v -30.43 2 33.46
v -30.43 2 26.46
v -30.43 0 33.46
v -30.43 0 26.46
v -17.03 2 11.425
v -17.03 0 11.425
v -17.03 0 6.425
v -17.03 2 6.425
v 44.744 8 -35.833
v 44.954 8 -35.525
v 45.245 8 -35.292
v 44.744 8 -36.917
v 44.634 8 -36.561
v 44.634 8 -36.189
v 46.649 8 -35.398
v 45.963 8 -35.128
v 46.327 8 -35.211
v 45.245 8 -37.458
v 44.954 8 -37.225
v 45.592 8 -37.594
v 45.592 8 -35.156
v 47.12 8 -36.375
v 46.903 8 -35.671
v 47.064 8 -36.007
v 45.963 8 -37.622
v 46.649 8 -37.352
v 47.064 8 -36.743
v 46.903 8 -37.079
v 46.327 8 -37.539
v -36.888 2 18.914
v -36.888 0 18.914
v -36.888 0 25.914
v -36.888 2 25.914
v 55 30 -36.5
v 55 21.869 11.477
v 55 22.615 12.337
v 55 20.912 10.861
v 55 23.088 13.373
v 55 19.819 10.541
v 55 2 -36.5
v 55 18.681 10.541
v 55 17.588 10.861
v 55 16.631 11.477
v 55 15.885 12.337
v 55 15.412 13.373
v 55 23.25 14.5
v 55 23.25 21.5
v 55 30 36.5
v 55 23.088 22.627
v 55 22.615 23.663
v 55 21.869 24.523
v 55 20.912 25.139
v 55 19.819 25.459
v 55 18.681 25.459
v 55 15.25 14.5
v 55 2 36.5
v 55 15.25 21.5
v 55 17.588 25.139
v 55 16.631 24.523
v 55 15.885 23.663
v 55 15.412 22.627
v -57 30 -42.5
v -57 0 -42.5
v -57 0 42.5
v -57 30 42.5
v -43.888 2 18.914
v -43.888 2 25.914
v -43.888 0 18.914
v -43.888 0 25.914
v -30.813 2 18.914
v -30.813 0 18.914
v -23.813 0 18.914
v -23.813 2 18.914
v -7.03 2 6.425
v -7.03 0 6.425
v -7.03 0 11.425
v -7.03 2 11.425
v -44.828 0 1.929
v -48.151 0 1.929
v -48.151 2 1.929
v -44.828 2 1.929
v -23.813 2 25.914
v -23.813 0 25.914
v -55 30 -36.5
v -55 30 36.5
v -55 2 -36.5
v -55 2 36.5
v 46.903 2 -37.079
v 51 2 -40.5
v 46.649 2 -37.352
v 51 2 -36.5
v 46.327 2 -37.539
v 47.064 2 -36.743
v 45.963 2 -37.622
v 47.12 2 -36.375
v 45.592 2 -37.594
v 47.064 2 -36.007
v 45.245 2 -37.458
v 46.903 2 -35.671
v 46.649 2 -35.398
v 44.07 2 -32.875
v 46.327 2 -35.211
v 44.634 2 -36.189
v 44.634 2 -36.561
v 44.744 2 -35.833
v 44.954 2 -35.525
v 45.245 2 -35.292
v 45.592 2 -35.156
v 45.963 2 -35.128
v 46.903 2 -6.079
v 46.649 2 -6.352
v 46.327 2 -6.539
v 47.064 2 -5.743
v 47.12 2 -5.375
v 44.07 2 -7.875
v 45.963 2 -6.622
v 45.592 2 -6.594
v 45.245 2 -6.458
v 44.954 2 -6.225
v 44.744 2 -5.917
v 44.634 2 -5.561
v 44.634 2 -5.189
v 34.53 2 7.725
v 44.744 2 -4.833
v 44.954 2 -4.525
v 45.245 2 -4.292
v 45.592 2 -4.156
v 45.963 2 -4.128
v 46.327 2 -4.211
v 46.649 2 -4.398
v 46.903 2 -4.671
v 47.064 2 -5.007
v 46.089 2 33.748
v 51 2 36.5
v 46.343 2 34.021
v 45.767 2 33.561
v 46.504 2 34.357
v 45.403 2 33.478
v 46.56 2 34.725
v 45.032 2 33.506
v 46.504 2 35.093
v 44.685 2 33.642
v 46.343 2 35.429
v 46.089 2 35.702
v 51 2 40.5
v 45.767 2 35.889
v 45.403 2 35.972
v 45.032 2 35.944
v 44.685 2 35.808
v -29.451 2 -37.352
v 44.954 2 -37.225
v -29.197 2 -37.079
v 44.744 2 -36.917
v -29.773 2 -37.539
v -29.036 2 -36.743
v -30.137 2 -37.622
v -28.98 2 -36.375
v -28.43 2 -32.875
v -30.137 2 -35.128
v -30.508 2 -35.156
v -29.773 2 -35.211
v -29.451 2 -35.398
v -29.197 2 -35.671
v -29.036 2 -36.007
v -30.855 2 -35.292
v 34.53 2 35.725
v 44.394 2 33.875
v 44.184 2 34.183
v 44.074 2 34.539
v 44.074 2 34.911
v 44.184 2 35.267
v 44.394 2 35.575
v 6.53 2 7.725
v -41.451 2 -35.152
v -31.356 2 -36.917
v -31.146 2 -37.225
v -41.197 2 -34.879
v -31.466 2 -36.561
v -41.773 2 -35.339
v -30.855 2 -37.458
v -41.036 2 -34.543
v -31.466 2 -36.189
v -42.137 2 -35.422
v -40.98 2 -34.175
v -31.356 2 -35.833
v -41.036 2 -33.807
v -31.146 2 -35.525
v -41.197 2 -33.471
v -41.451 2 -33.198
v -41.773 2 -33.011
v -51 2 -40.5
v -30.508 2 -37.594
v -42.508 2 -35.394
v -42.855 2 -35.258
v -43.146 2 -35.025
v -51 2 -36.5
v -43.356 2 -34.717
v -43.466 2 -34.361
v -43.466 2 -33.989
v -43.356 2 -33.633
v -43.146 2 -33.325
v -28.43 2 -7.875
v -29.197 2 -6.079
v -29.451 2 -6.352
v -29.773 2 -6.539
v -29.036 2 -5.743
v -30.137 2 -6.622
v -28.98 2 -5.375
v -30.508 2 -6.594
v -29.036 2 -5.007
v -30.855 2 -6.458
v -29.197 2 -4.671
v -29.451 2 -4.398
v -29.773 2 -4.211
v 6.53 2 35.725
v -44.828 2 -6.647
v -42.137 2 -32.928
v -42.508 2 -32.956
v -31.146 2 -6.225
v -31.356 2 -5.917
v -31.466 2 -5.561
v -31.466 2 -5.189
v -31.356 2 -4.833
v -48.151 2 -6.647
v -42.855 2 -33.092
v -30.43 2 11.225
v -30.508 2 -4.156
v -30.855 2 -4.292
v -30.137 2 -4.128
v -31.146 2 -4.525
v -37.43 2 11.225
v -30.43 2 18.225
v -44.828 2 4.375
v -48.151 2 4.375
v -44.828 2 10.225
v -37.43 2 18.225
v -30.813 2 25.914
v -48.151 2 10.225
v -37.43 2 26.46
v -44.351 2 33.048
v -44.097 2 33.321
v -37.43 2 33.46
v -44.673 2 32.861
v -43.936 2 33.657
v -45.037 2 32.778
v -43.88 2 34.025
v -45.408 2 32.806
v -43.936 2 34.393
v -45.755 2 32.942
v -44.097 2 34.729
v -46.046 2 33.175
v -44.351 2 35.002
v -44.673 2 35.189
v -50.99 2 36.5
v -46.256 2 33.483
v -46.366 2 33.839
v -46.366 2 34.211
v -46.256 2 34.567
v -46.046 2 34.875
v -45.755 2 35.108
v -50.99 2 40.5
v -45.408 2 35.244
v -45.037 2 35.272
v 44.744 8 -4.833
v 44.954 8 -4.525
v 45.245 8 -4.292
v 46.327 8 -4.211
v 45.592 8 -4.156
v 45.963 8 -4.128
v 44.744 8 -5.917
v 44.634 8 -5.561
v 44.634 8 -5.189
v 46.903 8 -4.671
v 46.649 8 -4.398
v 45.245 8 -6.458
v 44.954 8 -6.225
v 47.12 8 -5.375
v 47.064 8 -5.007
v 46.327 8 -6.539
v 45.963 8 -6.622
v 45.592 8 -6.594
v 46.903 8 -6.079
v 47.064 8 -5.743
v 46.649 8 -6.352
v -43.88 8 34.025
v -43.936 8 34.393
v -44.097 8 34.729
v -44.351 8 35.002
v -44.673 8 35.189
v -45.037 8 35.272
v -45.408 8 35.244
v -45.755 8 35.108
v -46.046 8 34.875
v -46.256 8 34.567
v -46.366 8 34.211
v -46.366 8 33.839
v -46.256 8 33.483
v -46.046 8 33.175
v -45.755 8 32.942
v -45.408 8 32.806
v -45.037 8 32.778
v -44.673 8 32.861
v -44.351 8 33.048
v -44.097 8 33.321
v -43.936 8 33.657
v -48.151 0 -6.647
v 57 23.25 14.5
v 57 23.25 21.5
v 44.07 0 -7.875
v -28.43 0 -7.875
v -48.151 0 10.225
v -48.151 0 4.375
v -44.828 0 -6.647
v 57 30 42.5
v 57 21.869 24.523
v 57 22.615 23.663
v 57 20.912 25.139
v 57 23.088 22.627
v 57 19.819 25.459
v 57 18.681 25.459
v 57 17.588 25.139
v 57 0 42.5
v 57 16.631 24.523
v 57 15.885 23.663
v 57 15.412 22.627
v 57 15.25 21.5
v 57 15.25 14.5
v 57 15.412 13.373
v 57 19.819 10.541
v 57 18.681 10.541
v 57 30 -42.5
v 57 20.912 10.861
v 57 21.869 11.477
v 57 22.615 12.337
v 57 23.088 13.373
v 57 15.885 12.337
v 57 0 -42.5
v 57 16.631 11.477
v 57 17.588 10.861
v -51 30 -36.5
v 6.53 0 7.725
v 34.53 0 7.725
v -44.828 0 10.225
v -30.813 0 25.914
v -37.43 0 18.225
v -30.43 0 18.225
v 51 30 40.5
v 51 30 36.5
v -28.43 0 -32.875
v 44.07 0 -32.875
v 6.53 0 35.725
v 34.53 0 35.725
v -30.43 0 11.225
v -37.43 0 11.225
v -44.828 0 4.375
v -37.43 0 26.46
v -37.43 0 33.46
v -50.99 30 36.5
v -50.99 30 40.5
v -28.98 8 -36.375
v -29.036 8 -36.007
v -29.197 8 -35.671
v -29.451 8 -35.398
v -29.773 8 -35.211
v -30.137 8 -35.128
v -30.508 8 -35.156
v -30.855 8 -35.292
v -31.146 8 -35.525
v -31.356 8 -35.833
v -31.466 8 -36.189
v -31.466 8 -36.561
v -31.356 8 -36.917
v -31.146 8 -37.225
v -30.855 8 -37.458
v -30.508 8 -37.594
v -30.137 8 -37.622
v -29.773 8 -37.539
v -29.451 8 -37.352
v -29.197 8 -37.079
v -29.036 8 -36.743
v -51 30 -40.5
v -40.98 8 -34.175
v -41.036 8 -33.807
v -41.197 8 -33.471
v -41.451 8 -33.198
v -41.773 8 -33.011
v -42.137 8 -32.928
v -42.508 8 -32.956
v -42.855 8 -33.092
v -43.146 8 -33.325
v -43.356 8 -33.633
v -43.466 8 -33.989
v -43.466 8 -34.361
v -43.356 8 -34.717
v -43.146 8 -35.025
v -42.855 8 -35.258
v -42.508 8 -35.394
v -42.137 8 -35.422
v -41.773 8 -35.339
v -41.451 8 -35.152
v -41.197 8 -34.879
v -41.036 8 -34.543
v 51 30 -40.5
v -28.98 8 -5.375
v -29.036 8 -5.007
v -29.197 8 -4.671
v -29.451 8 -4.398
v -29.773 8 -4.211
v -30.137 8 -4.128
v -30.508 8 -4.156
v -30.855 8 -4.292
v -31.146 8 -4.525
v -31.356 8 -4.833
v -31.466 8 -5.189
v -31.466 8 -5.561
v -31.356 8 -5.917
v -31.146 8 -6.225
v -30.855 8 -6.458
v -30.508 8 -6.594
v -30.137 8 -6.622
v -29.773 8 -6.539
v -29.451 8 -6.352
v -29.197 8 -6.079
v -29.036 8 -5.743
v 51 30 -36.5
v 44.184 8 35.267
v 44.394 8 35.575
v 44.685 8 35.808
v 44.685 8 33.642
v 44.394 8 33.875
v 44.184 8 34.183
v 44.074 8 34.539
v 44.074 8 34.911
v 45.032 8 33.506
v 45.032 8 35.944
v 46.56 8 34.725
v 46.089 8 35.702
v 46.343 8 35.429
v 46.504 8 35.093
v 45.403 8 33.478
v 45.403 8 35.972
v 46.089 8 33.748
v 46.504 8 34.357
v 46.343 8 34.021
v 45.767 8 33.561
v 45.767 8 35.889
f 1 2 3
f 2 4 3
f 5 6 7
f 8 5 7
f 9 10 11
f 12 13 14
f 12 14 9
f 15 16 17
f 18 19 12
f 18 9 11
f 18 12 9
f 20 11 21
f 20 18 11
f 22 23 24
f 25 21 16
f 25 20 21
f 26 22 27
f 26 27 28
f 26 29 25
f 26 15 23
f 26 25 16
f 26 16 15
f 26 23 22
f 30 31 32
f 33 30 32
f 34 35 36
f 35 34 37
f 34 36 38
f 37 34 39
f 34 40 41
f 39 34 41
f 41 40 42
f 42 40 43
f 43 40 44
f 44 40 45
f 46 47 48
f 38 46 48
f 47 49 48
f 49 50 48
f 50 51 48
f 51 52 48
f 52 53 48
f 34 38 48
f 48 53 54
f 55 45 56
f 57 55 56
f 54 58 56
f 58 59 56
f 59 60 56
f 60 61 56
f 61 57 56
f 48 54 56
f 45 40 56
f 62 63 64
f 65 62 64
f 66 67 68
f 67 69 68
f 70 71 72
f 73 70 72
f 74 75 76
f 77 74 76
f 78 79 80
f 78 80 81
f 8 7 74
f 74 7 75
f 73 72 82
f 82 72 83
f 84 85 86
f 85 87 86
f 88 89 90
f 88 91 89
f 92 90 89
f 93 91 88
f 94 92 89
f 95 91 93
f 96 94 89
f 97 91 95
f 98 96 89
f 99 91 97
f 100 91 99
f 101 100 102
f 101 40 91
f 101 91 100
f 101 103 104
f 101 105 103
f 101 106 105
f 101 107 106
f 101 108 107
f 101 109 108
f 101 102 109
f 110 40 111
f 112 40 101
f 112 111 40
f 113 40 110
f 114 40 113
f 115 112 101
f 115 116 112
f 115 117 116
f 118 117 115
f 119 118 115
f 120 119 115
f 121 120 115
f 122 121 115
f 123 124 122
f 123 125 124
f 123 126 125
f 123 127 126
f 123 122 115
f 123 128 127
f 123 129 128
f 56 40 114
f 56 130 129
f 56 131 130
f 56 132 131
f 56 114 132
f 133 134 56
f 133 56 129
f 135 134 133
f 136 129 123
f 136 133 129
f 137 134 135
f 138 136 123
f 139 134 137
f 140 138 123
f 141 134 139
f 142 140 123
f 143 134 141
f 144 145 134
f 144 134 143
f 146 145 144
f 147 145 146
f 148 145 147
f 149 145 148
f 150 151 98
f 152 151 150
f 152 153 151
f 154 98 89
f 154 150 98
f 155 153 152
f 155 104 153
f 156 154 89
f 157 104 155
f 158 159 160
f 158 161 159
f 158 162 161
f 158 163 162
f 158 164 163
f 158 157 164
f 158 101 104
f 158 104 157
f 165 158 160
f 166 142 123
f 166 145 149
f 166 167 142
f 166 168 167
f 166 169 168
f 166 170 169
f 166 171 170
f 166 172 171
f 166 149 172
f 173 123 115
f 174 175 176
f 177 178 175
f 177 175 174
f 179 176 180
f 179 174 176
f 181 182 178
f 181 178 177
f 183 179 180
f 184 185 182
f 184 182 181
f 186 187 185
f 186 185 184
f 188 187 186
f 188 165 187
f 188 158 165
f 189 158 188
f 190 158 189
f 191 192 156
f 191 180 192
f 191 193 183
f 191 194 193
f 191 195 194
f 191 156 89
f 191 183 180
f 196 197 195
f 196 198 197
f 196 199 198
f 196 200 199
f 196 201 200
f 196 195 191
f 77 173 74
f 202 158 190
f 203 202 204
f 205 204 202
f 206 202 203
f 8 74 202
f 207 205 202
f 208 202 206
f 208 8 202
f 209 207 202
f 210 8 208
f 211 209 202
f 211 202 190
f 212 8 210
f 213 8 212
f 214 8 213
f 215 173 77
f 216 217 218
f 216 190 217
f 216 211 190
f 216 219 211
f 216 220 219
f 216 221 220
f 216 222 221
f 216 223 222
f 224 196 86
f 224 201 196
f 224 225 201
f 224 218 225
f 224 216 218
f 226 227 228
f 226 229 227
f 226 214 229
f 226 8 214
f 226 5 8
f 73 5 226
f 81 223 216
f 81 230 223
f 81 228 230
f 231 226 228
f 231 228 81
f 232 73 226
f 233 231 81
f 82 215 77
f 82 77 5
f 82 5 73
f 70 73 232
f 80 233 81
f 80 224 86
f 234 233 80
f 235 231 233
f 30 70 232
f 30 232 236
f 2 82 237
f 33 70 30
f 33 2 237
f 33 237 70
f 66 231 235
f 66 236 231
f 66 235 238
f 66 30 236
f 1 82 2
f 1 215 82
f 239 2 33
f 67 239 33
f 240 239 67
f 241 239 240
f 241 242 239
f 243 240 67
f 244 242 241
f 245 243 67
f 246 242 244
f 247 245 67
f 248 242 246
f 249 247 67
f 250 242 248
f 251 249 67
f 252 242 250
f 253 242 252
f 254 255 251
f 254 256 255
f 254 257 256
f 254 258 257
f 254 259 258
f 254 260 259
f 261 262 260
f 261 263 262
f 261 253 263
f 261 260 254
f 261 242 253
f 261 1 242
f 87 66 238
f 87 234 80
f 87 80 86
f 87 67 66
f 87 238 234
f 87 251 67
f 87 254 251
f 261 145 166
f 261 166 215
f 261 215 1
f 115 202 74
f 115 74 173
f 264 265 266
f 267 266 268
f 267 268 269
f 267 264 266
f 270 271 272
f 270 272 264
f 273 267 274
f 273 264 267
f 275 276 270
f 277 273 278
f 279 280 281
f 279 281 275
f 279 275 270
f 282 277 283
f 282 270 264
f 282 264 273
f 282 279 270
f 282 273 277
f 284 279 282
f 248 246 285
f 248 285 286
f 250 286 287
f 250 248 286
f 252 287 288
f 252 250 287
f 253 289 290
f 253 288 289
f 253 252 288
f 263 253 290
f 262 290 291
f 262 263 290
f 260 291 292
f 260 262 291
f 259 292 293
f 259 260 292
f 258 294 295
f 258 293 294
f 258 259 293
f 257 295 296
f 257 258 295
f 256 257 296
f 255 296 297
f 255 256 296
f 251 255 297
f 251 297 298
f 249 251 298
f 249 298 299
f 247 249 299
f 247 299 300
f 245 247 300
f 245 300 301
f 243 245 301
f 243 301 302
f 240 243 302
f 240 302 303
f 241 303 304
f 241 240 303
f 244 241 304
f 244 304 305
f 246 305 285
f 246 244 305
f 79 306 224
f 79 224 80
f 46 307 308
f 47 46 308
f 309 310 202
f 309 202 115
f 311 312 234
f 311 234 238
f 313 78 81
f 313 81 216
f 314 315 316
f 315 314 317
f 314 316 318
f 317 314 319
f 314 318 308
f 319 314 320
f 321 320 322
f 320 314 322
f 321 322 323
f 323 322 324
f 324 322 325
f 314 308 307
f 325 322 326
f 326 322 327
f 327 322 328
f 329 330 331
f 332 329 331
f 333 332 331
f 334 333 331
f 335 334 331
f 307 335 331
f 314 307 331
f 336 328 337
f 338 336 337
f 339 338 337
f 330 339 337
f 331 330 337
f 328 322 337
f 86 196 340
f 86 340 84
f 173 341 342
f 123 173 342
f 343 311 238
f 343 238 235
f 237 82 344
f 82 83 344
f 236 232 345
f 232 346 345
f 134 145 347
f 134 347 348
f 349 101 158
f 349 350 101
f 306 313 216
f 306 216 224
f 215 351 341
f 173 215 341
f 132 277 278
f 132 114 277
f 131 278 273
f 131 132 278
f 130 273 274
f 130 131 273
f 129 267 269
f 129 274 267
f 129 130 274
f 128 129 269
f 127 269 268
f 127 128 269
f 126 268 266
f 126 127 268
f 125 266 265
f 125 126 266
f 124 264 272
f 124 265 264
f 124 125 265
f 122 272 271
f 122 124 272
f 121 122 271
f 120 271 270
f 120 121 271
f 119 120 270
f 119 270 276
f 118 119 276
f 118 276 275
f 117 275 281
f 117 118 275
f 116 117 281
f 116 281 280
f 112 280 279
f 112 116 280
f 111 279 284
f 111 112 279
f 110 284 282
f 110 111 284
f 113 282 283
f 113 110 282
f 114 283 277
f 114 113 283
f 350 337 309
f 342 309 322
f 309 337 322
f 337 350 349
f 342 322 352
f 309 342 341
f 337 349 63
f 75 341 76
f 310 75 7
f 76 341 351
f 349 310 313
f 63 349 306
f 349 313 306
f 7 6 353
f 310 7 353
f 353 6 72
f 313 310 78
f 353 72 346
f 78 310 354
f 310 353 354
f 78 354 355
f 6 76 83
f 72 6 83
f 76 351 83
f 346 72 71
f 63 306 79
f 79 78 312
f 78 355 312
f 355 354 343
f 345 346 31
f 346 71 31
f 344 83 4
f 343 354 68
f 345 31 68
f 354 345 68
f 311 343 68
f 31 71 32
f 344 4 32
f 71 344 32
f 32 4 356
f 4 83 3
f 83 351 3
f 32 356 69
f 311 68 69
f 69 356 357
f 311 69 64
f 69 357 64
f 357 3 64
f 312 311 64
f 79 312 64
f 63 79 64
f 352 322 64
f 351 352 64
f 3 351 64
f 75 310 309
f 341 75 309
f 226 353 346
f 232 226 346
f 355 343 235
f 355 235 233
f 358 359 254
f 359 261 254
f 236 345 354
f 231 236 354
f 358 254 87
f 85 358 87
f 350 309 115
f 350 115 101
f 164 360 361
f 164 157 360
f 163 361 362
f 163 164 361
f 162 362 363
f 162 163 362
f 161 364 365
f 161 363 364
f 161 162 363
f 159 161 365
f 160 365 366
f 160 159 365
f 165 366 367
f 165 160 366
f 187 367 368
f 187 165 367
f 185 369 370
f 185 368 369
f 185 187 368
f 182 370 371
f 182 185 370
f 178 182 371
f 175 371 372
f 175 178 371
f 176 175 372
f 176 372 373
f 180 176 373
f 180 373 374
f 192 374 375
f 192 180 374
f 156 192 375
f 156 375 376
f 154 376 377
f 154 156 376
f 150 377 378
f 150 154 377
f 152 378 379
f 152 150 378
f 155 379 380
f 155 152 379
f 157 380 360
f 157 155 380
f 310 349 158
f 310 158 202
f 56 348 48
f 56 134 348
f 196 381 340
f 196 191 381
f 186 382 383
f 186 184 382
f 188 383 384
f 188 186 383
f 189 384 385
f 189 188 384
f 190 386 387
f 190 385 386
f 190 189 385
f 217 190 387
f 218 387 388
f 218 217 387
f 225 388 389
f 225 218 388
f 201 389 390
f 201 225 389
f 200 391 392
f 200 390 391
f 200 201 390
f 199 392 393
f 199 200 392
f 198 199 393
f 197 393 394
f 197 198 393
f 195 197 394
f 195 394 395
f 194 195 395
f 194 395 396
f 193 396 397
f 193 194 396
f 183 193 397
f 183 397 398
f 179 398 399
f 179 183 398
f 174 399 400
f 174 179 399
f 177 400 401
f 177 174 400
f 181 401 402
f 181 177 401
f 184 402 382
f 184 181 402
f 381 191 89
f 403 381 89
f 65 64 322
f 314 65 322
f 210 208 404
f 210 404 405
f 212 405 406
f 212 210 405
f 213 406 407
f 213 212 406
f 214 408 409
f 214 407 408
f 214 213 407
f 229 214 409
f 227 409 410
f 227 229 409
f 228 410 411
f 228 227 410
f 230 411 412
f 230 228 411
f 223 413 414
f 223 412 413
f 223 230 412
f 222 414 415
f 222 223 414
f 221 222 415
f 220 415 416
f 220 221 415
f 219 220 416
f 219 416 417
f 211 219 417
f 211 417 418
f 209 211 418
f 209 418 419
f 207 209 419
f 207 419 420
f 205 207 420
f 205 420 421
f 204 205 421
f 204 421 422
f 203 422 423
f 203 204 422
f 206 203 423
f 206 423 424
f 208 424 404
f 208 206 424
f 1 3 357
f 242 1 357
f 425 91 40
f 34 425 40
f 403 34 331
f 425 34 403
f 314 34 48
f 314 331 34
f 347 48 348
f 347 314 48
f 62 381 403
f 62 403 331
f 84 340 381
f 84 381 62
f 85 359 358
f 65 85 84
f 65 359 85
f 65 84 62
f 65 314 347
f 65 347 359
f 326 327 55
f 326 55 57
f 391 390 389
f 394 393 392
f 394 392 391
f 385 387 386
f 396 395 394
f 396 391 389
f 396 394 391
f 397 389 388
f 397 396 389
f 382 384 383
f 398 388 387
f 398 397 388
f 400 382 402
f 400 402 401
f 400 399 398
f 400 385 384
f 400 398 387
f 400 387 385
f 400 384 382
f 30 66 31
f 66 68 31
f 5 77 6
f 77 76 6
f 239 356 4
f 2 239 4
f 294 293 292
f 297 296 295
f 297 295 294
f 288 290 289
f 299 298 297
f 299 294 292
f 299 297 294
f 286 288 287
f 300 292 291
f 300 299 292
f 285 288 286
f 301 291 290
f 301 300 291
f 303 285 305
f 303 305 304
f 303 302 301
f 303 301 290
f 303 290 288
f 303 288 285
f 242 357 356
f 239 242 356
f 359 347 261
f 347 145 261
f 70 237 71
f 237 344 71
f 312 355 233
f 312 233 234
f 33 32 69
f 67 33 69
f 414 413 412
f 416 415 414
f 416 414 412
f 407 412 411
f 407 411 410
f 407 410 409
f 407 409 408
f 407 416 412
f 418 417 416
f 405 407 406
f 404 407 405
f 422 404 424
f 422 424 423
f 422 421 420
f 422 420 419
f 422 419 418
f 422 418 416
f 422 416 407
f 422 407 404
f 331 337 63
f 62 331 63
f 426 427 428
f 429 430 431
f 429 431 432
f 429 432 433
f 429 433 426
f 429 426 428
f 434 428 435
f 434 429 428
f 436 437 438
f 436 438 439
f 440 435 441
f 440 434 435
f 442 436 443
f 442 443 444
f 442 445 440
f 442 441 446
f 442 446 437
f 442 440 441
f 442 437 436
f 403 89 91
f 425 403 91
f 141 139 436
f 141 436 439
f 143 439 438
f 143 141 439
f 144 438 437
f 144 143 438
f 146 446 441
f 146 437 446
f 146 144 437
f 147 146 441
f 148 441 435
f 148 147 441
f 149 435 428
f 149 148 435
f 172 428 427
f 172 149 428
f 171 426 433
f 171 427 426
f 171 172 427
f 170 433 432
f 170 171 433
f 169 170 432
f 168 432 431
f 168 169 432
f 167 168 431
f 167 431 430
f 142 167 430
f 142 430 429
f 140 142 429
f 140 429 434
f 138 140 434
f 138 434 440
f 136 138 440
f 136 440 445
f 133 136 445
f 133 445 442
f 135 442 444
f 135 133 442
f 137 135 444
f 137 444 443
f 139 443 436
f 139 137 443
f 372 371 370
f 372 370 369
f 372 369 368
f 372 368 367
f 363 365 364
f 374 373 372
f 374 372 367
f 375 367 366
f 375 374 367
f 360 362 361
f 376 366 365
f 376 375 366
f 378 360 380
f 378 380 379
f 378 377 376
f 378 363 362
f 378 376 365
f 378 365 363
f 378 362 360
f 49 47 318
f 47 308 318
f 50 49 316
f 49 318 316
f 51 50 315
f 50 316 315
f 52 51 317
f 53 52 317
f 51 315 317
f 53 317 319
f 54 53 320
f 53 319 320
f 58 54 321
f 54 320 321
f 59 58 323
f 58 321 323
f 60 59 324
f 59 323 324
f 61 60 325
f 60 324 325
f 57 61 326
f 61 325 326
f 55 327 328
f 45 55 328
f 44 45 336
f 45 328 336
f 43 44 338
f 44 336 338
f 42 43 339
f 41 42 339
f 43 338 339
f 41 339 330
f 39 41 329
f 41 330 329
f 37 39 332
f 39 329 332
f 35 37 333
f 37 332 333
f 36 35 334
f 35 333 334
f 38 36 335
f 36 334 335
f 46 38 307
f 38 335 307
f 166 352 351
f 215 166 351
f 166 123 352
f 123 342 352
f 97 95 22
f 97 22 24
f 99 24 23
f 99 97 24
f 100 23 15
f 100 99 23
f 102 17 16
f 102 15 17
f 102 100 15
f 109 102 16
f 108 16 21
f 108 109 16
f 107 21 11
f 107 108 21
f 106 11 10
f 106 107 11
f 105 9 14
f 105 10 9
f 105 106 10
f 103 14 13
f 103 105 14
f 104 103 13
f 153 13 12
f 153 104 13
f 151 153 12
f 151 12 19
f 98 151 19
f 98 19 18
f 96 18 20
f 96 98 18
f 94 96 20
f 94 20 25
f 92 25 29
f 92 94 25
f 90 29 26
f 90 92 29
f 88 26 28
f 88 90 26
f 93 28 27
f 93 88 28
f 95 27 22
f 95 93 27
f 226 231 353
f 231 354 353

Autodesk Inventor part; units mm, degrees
ref_plane "YZ Plane" through (0, 0, 0) normal (1, 0, 0) x (0, 1, 0)
ref_plane "XZ Plane" through (0, 0, 0) normal (0, 1, 0) x (-1, 0, 0)
ref_plane "XY Plane" through (0, 0, 0) normal (0, 0, 1) x (1, 0, 0)
sketch "Sketch1" plane through (0, 0, 0) normal (0, 1, 0) x (-1, 0, 0)
  line L0 (55, -40.5) -> (-55, -40.5)
  line L1 (-55, -40.5) -> (-55, 40.5)
  line L2 (-55, 40.5) -> (55, 40.5)
  line L3 (55, 40.5) -> (55, -40.5)
  line L4 (55, -40.5) -> (-55, 40.5) construction
  line L5 (-55, -40.5) -> (55, 40.5) construction
  line L6 (57, 42.5) -> (-57, 42.5)
  line L7 (-57, 42.5) -> (-57, -42.5)
  line L8 (-57, -42.5) -> (57, -42.5)
  line L9 (57, -42.5) -> (57, 42.5)
  line L10 (57, 42.5) -> (-57, -42.5) construction
  line L11 (-57, 42.5) -> (57, -42.5) construction
  line L12 (50.43, 39.125) -> (-50.43, 39.125)
  line L13 (-50.43, 39.125) -> (-50.43, -39.125)
  line L14 (-50.43, -39.125) -> (50.43, -39.125)
  line L15 (50.43, -39.125) -> (50.43, 39.125)
  line L16 (50.43, 39.125) -> (-50.43, -39.125) construction
  line L17 (-50.43, 39.125) -> (50.43, -39.125) construction
  point P0 (0, 0)
  dimension "d0" = 110
  dimension "d1" = 81
  dimension "d2" = 114
  dimension "d3" = 85
  dimension "d190" = 100.86
  dimension "d191" = 78.25
extrude "Extrusion1" add sketch "Sketch1" along normal blind 30 contours L9 L8 L7 L6
sketch "Sketch2" plane through (0, 0, 0) normal (0, 1, 0) x (-1, 0, 0)
  line L0 (-55, -40.5) -> (-55, 40.5) projected
  line L1 (55, 40.5) -> (-55, 40.5)
  line L2 (-55, 40.5) -> (-55, -40.5)
  line L3 (-55, -40.5) -> (55, -40.5)
  line L4 (55, -40.5) -> (55, 40.5)
  line L5 (55, 40.5) -> (-55, -40.5) construction
  line L6 (-55, 40.5) -> (55, -40.5) construction
  point P0 (0, 0)
extrude "Extrusion2" add sketch "Sketch2" along normal blind 2
sketch "Sketch3" plane through (0, 0, 0) normal (0, -1, 0) x (1, 0, 0)
  line L0 (44.07, -32.875) -> (-28.43, -32.875)
  line L1 (-28.43, -32.875) -> (-28.43, -7.875)
  line L2 (-28.43, -7.875) -> (44.07, -7.875)
  line L3 (44.07, -7.875) -> (44.07, -32.875)
  line L4 (34.53, 35.725) -> (6.53, 35.725)
  line L5 (6.53, 35.725) -> (6.53, 7.725)
  line L6 (6.53, 7.725) -> (34.53, 7.725)
  line L7 (34.53, 7.725) -> (34.53, 35.725)
  line L8 (-7.03, 11.425) -> (-17.03, 11.425)
  line L9 (-17.03, 11.425) -> (-17.03, 6.425)
  line L10 (-17.03, 6.425) -> (-7.03, 6.425)
  line L11 (-7.03, 6.425) -> (-7.03, 11.425)
  line L12 (50.43, 39.125) -> (-50.43, 39.125)
  line L13 (-50.43, 39.125) -> (-50.43, -39.125)
  line L14 (-50.43, -39.125) -> (50.43, -39.125)
  line L15 (50.43, -39.125) -> (50.43, 39.125)
  line L16 (50.43, 39.125) -> (-50.43, -39.125) construction
  line L17 (-50.43, 39.125) -> (50.43, -39.125) construction
  line L18 (-30.4304, 18.225) -> (-37.4304, 18.225)
  line L19 (-37.4304, 18.225) -> (-37.4304, 11.225)
  line L20 (-37.4304, 11.225) -> (-30.4304, 11.225)
  line L21 (-30.4304, 11.225) -> (-30.4304, 18.225)
  line L22 (-30.4304, 18.225) -> (-37.4304, 11.225) construction
  line L23 (-37.4304, 18.225) -> (-30.4304, 11.225) construction
  line L24 (-30.4304, 33.4598) -> (-37.4304, 33.4598)
  line L25 (-37.4304, 33.4598) -> (-37.4304, 26.4598)
  line L26 (-37.4304, 26.4598) -> (-30.4304, 26.4598)
  line L27 (-30.4304, 26.4598) -> (-30.4304, 33.4598)
  line L28 (-30.4304, 33.4598) -> (-37.4304, 26.4598) construction
  line L29 (-37.4304, 33.4598) -> (-30.4304, 26.4598) construction
  line L30 (-23.8133, 25.9138) -> (-30.8133, 25.9138)
  line L31 (-30.8133, 25.9138) -> (-30.8133, 18.9138)
  line L32 (-30.8133, 18.9138) -> (-23.8133, 18.9138)
  line L33 (-23.8133, 18.9138) -> (-23.8133, 25.9138)
  line L34 (-23.8133, 25.9138) -> (-30.8133, 18.9138) construction
  line L35 (-30.8133, 25.9138) -> (-23.8133, 18.9138) construction
  line L36 (-36.8875, 25.9138) -> (-43.8875, 25.9138)
  line L37 (-43.8875, 25.9138) -> (-43.8875, 18.9138)
  line L38 (-43.8875, 18.9138) -> (-36.8875, 18.9138)
  line L39 (-36.8875, 18.9138) -> (-36.8875, 25.9138)
  line L40 (-36.8875, 25.9138) -> (-43.8875, 18.9138) construction
  line L41 (-43.8875, 25.9138) -> (-36.8875, 18.9138) construction
  line L42 (-50.43, 39.125) -> (50.4731, 39.0489) construction
  line L43 (50.4731, 39.0489) -> (50.4141, -39.1891) construction
  line L44 (50.4141, -39.1891) -> (-50.489, -39.113) construction
  line L45 (-50.489, -39.113) -> (-50.43, 39.125) construction
  line L46 (17.9042, 35.3523) -> (15.6181, 35.3523)
  line L47 (47.7465, 12.6947) -> (44.5311, 12.6947)
  line L48 (46.7465, 20.4524) -> (43.1682, 20.4524)
  line L49 (-57, 42.5) -> (57, 42.5) projected
  line L50 (-44.8275, -6.6468) -> (-48.1514, -6.6468)
  line L51 (-48.1514, -6.6468) -> (-48.1514, 1.9287)
  line L52 (-48.1514, 1.9287) -> (-44.8275, 1.9287)
  line L53 (-44.8275, 1.9287) -> (-44.8275, -6.6468)
  line L54 (-44.8275, 4.375) -> (-48.1514, 4.375)
  line L55 (-48.1514, 4.375) -> (-48.1514, 10.225)
  line L56 (-48.1514, 10.225) -> (-44.8275, 10.225)
  line L57 (-44.8275, 10.225) -> (-44.8275, 4.375)
  point P0 (0, 0)
  point P1 (-33.9304, 14.725)
  point P2 (-33.9304, 29.9598)
  point P3 (-27.3133, 22.4138)
  point P4 (-40.3875, 22.4138)
  point P5 (46.1388, 12.6947)
  dimension "d8" = 72.5
  dimension "d9" = 25
  dimension "d18" = 28
  dimension "d19" = 28
  dimension "d20" = 10
  dimension "d21" = 5
  dimension "d22" = 100.86
  dimension "d23" = 78.25
  dimension "d31" = 3.4
  dimension "d32" = 15.9
  dimension "d33" = 22
  dimension "d35" = 33.4
  dimension "d36" = 27.7
  dimension "d45" = 7
  dimension "d46" = 7
  dimension "d47" = 7
  dimension "d48" = 7
  dimension "d135" = 7
  dimension "d136" = 7
  dimension "d137" = 7
  dimension "d138" = 7
  dimension "d203" = 47
  dimension "d580" = 3.7727
  dimension "d585" = 22.0476
extrude "Extrusion3" cut sketch "Sketch3" against normal blind 30 contours L0 L1 L2 L3 | L7 L6 L5 L4 | L11 L10 L9 L8 | L21 L20 L19 L18 | L27 L26 L25 L24 | L33 L32 L31 L30 | L39 L38 L37 L36 | L50 L51 L52 L53 | L54 L55 L56 L57
sketch "Sketch4" plane through (0, 2, 0) normal (0, 1, 0) x (1, 0, 0)
  circle A0 centre (-45.13, -34.025) radius 1.25
  line L0 (55, -40.5) -> (-55, -40.5) projected
  line L1 (-55, -40.5) -> (-55, 40.5) projected
  circle A1 centre (-42.23, 34.175) radius 1.25
  line L2 (-55, 40.5) -> (55, 40.5) projected
  circle A2 centre (45.31, -34.725) radius 1.25
  line L3 (55, 40.5) -> (55, -40.5) projected
  line L4 (-50.43, -39.125) -> (50.43, -39.125)
  line L5 (50.43, -39.125) -> (50.43, 39.125)
  line L6 (50.43, 39.125) -> (-50.43, 39.125)
  line L7 (-50.43, 39.125) -> (-50.43, -39.125)
  line L8 (-50.43, -39.125) -> (50.43, 39.125) construction
  line L9 (50.43, -39.125) -> (-50.43, 39.125) construction
  circle A3 centre (-30.23, 36.375) radius 1.25
  circle A4 centre (45.87, 36.375) radius 1.25
  circle A5 centre (-30.23, 5.375) radius 1.25
  circle A6 centre (45.87, 5.375) radius 1.25
  line L10 (-28.43, 7.875) -> (-28.43, 32.875) projected
  line L11 (44.07, 32.875) -> (44.07, 7.875) projected
  line L12 (-28.43, 32.875) -> (44.07, 32.875) projected
  line L13 (44.07, 7.875) -> (-28.43, 7.875) projected
  line L14 (-50.43, 39.125) -> (50.4734, 39.0562) construction
  line L15 (50.4734, 39.0562) -> (50.42, -39.1821) construction
  line L16 (50.42, -39.1821) -> (-50.4834, -39.1133) construction
  line L17 (-50.4834, -39.1133) -> (-50.43, 39.125) construction
  point P0 (0, 0)
  dimension "d181" = 2.5
  dimension "d184" = 2.5
  dimension "d187" = 2.5
  dimension "d192" = 100.86
  dimension "d193" = 78.25
  dimension "d194" = 8.2
  dimension "d195" = 4.95
  dimension "d196" = 5.3
  dimension "d197" = 5.1
  dimension "d198" = 5.12
  dimension "d199" = 4.4
  dimension "d204" = 2.5
  dimension "d205" = 2.5
  dimension "d206" = 2.5
  dimension "d207" = 2.5
  dimension "d209" = 1.8
  dimension "d211" = 1.8
  dimension "d212" = 1.8
  dimension "d213" = 1.8
  dimension "d214" = 3.5
  dimension "d215" = 3.5
  dimension "d216" = 2.5
  dimension "d217" = 2.5
extrude "Extrusion4" add sketch "Sketch4" along normal blind 6 contours A0 | A1 | A2 | A3 | A4 | A5 | A6
sketch "Sketch5" plane through (0, 2, 0) normal (0, 1, 0) x (1, 0, 0)
  line L0 (50.43, 39.125) -> (-50.43, 39.125)
  line L1 (-50.43, 39.125) -> (-50.43, -39.125)
  line L2 (-50.43, -39.125) -> (50.43, -39.125)
  line L3 (50.43, -39.125) -> (50.43, 39.125)
  line L4 (50.43, 39.125) -> (-50.43, -39.125) construction
  line L5 (-50.43, 39.125) -> (50.43, -39.125) construction
  point P0 (0, 0)
  dimension "d352" = 78.25
  dimension "d353" = 100.86
sketch "Sketch6" plane through (0, 2, 0) normal (0, 1, 0) x (1, 0, 0)
  line L0 (55, -40.5) -> (-55, -40.5) projected
  line L1 (55, -40.5) -> (51, -40.5)
  line L2 (51, -40.5) -> (51, -36.5)
  line L3 (51, -36.5) -> (55, -36.5)
  line L4 (55, -36.5) -> (55, -40.5)
  line L5 (-55, 40.5) -> (55, 40.5) projected
  line L6 (55, 40.5) -> (51, 40.5)
  line L7 (51, 40.5) -> (51, 36.5)
  line L8 (51, 36.5) -> (55, 36.5)
  line L9 (55, 36.5) -> (55, 40.5)
  line L10 (-54.9902, -40.5) -> (-50.9902, -40.5)
  line L11 (-50.9902, -40.5) -> (-50.9902, -36.5)
  line L12 (-50.9902, -36.5) -> (-54.9902, -36.5)
  line L13 (-54.9902, -36.5) -> (-55, -36.5)
  line L14 (55, -40.5) -> (-55, -40.5) projected
  line L15 (-50.9902, -40.5) -> (-55, -40.5)
  line L16 (-55, -40.5) -> (-55, -36.5)
  line L17 (-55, 40.5) -> (55, 40.5) projected
  line L18 (-50.424, 39.0879) -> (50.4561, 39.0879) construction
  line L19 (50.4561, 39.0879) -> (50.4561, -39.1323) construction
  line L20 (50.4561, -39.1323) -> (-50.424, -39.1323) construction
  line L21 (-50.424, -39.1323) -> (-50.424, 39.0879) construction
  line L22 (-49.2051, 39.0879) -> (-45.6234, 39.0879)
  line L23 (-48.1397, 6.687) -> (-44.6458, 6.687)
  line L24 (-48.2072, -10.3595) -> (-44.6458, -10.3595)
  line L25 (-55, 40.5) -> (-51, 40.5)
  line L26 (-51, 40.5) -> (-51, 36.5)
  line L27 (-51, 36.5) -> (-55, 36.5)
  line L28 (-55, 36.5) -> (-55, 40.5)
  line L29 (-51, 40.5) -> (51, 40.5)
  line L30 (57, 42.5) -> (-57, 42.5) projected
  line L31 (55, 36.5) -> (55, -36.5)
  line L32 (51, -40.5) -> (-50.9902, -40.5)
  line L33 (-55, -36.5) -> (-55, 36.5)
  line L34 (55, 40.5) -> (55, -40.5) projected
  line L35 (55, 40.5) -> (55, -40.5)
  line L36 (55, 40.5) -> (55, -40.5)
  point P0 (0, 0)
  dimension "d443" = 4
  dimension "d444" = 4
  dimension "d445" = 4
  dimension "d446" = 4
  dimension "d447" = 4
  dimension "d448" = 4
  dimension "d564" = 30.1405
  dimension "d591" = 4
  dimension "d592" = 4
  dimension "d599" = 110
  dimension "d600" = 81
extrude "Extrusion5" add sketch "Sketch6" along normal up to surface (28 mm away) contours L0 L2 L3 L4 | L0 L16 L13 L12 L11 | L8 L7 L5 L9 | L26 L27 L28 L5
sketch "Sketch8" plane through (57, 0, 42.5) normal (1, 0, 0) x (0, 0, -1)
  line L0 (28, 23.25) -> (28, 15.25) construction
  line L1 (28, 23.25) -> (36, 23.25) construction
  line L2 (28, 15.25) -> (21, 15.25)
  line L3 (21, 15.25) -> (22.6917, 15.25)
  line L4 (28, 23.25) -> (21, 23.25)
  arc A0 (21, 23.25) -> (21, 15.25) centre (21, 19.25) ccw
  arc A1 (28, 15.25) -> (28, 23.25) centre (28, 19.25) ccw
  line L5 (0, 30) -> (85, 30) projected
  line L6 (0, 0) -> (0, 30) projected
  line L7 (0, 0) -> (85, 0) projected
  line L8 (24.5, 23.25) -> (24.5, 15.25) construction
  point P0 (42.5, 0)
  point P1 (0, 15)
  point P2 (17, 19.25)
  point P3 (24.5, 19.25)
  dimension "d573" = 90
  dimension "d574" = 7
  dimension "d609" = 24.5
  dimension "d610" = 8
  dimension "d611" = 10.75
extrude "Extrusion9" cut sketch "Sketch8" against normal blind 3
properties part number "plant watner 2.0 case"
